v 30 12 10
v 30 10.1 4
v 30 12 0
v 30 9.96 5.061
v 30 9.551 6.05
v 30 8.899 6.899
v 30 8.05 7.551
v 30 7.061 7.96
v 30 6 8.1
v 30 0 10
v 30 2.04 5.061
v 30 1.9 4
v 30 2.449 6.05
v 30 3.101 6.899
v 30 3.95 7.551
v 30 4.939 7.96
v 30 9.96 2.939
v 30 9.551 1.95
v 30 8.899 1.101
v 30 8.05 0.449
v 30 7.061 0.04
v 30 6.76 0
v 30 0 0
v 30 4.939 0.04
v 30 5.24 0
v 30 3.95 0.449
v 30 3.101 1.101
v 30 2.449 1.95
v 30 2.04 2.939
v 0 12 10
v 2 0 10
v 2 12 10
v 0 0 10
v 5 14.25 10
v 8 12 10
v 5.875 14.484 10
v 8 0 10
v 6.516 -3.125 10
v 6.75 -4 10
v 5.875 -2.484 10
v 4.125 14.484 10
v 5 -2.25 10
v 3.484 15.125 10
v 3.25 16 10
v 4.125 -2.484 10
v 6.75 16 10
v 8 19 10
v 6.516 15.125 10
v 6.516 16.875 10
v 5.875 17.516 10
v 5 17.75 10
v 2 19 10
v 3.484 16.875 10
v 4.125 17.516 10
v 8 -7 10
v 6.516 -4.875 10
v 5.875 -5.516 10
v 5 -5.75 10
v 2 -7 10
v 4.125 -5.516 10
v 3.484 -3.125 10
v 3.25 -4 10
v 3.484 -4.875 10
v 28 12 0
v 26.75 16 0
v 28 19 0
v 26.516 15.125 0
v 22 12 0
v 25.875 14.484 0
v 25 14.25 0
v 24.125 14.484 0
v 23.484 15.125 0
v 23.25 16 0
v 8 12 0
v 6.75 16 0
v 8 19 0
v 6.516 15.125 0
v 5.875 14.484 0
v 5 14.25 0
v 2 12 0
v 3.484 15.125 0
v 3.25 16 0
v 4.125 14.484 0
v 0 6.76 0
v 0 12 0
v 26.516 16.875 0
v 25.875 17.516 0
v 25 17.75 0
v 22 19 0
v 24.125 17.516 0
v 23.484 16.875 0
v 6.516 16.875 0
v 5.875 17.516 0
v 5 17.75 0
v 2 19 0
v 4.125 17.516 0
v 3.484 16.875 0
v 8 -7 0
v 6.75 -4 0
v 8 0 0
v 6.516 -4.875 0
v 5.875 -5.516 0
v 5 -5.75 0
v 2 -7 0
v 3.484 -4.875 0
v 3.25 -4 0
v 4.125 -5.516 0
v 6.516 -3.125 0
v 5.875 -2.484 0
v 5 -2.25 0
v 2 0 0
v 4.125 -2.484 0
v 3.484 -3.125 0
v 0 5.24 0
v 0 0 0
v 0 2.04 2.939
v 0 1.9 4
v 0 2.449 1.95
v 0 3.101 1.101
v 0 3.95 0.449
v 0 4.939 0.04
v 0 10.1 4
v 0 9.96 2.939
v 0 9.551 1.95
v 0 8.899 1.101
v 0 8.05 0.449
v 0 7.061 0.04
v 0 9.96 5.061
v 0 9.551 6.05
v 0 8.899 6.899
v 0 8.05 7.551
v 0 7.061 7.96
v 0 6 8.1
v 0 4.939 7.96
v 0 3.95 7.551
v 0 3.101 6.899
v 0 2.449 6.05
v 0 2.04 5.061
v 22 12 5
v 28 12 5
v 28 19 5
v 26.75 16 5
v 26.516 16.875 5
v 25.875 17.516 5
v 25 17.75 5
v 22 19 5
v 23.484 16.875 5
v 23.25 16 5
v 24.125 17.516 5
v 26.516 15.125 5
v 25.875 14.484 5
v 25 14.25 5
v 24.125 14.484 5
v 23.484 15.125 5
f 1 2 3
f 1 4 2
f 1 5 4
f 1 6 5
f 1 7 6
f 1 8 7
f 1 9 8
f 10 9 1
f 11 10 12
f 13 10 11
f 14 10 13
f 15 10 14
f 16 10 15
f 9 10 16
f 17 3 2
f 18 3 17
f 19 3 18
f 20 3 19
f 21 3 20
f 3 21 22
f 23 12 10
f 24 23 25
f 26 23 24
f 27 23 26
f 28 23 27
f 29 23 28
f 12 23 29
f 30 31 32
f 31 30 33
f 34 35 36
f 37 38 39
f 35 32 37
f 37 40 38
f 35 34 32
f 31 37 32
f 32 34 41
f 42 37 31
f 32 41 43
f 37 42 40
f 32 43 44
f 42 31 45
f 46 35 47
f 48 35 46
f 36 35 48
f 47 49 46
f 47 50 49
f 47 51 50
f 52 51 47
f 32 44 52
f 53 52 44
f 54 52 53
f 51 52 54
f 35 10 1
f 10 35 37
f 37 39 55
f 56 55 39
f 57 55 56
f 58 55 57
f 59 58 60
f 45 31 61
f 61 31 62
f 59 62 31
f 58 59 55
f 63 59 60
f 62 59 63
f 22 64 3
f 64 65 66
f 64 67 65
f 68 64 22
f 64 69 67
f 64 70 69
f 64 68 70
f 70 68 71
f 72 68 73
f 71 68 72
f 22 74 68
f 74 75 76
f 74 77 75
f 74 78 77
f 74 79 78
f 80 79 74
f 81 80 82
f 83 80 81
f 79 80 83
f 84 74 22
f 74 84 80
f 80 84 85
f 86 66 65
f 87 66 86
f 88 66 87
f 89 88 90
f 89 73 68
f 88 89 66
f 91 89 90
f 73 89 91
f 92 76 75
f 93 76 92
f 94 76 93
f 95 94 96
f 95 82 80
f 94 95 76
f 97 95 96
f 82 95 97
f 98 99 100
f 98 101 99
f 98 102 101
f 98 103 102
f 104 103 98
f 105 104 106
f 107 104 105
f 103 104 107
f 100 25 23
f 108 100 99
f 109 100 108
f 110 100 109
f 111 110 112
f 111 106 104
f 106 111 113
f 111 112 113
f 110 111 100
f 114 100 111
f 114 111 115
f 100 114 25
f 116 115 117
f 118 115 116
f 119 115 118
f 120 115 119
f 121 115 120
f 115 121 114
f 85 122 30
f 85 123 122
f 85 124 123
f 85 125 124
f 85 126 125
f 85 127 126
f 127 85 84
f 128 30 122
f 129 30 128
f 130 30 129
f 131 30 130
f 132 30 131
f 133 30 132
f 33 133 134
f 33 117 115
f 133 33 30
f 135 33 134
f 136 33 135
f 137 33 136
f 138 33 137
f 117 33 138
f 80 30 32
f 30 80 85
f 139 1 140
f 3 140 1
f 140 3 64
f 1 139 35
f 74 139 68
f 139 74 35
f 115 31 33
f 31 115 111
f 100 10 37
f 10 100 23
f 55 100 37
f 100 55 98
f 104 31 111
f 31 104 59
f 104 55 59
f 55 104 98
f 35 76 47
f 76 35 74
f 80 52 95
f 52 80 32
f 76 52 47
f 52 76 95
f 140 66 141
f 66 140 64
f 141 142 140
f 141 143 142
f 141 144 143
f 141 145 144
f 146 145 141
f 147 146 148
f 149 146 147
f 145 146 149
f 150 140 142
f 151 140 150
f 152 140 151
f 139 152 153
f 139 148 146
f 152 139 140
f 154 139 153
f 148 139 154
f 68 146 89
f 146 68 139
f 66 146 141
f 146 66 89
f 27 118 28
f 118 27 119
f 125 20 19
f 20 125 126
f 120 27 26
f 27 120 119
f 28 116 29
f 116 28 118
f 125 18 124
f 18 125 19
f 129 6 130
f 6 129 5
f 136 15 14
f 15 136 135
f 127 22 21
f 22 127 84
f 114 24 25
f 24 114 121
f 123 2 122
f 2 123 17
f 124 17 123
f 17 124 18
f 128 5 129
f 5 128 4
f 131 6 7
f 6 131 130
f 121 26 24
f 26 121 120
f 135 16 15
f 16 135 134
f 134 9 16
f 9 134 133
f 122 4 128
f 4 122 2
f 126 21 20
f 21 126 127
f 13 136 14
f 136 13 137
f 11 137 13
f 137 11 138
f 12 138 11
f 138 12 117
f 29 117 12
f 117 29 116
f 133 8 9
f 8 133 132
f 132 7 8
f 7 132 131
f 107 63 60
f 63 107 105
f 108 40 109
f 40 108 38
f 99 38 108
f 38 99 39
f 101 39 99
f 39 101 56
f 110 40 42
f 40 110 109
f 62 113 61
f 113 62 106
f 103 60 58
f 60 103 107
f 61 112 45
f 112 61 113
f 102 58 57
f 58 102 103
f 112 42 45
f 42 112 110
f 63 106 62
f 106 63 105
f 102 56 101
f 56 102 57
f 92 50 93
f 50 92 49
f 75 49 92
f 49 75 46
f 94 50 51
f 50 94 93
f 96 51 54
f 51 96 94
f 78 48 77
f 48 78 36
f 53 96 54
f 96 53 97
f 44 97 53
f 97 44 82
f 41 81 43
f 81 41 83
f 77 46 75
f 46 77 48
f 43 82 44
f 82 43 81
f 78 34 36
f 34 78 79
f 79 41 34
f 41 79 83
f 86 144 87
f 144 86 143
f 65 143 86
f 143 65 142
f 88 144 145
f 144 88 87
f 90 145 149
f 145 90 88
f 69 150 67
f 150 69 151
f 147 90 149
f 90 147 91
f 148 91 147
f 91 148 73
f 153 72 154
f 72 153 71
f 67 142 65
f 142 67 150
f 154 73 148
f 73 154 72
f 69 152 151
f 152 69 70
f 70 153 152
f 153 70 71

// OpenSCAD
difference()
{
    union()
    {
        cube([30,12,10]);
        
        translate([2,-4-3,0])
            cube([6,8,10]);
            //cylinder(d=3.5,h=4,$fn=12);
        translate([2,11,0])
            cube([6,8,10]);
        translate([2+20,11,0])
            cube([6,8,5]);
    }
    union()
    {
        translate([0,6,4])
            rotate([0,90,0])
                cylinder(d=8.2,h=30,$fn=24);
        
        translate([5,-4,0])
            cylinder(d=3.5,h=10,$fn=12);
        translate([5,6+6+4,0])
            cylinder(d=3.5,h=10,$fn=12);
        translate([5+20,6+6+4,0])
            cylinder(d=3.5,h=10,$fn=12);
    }
}
